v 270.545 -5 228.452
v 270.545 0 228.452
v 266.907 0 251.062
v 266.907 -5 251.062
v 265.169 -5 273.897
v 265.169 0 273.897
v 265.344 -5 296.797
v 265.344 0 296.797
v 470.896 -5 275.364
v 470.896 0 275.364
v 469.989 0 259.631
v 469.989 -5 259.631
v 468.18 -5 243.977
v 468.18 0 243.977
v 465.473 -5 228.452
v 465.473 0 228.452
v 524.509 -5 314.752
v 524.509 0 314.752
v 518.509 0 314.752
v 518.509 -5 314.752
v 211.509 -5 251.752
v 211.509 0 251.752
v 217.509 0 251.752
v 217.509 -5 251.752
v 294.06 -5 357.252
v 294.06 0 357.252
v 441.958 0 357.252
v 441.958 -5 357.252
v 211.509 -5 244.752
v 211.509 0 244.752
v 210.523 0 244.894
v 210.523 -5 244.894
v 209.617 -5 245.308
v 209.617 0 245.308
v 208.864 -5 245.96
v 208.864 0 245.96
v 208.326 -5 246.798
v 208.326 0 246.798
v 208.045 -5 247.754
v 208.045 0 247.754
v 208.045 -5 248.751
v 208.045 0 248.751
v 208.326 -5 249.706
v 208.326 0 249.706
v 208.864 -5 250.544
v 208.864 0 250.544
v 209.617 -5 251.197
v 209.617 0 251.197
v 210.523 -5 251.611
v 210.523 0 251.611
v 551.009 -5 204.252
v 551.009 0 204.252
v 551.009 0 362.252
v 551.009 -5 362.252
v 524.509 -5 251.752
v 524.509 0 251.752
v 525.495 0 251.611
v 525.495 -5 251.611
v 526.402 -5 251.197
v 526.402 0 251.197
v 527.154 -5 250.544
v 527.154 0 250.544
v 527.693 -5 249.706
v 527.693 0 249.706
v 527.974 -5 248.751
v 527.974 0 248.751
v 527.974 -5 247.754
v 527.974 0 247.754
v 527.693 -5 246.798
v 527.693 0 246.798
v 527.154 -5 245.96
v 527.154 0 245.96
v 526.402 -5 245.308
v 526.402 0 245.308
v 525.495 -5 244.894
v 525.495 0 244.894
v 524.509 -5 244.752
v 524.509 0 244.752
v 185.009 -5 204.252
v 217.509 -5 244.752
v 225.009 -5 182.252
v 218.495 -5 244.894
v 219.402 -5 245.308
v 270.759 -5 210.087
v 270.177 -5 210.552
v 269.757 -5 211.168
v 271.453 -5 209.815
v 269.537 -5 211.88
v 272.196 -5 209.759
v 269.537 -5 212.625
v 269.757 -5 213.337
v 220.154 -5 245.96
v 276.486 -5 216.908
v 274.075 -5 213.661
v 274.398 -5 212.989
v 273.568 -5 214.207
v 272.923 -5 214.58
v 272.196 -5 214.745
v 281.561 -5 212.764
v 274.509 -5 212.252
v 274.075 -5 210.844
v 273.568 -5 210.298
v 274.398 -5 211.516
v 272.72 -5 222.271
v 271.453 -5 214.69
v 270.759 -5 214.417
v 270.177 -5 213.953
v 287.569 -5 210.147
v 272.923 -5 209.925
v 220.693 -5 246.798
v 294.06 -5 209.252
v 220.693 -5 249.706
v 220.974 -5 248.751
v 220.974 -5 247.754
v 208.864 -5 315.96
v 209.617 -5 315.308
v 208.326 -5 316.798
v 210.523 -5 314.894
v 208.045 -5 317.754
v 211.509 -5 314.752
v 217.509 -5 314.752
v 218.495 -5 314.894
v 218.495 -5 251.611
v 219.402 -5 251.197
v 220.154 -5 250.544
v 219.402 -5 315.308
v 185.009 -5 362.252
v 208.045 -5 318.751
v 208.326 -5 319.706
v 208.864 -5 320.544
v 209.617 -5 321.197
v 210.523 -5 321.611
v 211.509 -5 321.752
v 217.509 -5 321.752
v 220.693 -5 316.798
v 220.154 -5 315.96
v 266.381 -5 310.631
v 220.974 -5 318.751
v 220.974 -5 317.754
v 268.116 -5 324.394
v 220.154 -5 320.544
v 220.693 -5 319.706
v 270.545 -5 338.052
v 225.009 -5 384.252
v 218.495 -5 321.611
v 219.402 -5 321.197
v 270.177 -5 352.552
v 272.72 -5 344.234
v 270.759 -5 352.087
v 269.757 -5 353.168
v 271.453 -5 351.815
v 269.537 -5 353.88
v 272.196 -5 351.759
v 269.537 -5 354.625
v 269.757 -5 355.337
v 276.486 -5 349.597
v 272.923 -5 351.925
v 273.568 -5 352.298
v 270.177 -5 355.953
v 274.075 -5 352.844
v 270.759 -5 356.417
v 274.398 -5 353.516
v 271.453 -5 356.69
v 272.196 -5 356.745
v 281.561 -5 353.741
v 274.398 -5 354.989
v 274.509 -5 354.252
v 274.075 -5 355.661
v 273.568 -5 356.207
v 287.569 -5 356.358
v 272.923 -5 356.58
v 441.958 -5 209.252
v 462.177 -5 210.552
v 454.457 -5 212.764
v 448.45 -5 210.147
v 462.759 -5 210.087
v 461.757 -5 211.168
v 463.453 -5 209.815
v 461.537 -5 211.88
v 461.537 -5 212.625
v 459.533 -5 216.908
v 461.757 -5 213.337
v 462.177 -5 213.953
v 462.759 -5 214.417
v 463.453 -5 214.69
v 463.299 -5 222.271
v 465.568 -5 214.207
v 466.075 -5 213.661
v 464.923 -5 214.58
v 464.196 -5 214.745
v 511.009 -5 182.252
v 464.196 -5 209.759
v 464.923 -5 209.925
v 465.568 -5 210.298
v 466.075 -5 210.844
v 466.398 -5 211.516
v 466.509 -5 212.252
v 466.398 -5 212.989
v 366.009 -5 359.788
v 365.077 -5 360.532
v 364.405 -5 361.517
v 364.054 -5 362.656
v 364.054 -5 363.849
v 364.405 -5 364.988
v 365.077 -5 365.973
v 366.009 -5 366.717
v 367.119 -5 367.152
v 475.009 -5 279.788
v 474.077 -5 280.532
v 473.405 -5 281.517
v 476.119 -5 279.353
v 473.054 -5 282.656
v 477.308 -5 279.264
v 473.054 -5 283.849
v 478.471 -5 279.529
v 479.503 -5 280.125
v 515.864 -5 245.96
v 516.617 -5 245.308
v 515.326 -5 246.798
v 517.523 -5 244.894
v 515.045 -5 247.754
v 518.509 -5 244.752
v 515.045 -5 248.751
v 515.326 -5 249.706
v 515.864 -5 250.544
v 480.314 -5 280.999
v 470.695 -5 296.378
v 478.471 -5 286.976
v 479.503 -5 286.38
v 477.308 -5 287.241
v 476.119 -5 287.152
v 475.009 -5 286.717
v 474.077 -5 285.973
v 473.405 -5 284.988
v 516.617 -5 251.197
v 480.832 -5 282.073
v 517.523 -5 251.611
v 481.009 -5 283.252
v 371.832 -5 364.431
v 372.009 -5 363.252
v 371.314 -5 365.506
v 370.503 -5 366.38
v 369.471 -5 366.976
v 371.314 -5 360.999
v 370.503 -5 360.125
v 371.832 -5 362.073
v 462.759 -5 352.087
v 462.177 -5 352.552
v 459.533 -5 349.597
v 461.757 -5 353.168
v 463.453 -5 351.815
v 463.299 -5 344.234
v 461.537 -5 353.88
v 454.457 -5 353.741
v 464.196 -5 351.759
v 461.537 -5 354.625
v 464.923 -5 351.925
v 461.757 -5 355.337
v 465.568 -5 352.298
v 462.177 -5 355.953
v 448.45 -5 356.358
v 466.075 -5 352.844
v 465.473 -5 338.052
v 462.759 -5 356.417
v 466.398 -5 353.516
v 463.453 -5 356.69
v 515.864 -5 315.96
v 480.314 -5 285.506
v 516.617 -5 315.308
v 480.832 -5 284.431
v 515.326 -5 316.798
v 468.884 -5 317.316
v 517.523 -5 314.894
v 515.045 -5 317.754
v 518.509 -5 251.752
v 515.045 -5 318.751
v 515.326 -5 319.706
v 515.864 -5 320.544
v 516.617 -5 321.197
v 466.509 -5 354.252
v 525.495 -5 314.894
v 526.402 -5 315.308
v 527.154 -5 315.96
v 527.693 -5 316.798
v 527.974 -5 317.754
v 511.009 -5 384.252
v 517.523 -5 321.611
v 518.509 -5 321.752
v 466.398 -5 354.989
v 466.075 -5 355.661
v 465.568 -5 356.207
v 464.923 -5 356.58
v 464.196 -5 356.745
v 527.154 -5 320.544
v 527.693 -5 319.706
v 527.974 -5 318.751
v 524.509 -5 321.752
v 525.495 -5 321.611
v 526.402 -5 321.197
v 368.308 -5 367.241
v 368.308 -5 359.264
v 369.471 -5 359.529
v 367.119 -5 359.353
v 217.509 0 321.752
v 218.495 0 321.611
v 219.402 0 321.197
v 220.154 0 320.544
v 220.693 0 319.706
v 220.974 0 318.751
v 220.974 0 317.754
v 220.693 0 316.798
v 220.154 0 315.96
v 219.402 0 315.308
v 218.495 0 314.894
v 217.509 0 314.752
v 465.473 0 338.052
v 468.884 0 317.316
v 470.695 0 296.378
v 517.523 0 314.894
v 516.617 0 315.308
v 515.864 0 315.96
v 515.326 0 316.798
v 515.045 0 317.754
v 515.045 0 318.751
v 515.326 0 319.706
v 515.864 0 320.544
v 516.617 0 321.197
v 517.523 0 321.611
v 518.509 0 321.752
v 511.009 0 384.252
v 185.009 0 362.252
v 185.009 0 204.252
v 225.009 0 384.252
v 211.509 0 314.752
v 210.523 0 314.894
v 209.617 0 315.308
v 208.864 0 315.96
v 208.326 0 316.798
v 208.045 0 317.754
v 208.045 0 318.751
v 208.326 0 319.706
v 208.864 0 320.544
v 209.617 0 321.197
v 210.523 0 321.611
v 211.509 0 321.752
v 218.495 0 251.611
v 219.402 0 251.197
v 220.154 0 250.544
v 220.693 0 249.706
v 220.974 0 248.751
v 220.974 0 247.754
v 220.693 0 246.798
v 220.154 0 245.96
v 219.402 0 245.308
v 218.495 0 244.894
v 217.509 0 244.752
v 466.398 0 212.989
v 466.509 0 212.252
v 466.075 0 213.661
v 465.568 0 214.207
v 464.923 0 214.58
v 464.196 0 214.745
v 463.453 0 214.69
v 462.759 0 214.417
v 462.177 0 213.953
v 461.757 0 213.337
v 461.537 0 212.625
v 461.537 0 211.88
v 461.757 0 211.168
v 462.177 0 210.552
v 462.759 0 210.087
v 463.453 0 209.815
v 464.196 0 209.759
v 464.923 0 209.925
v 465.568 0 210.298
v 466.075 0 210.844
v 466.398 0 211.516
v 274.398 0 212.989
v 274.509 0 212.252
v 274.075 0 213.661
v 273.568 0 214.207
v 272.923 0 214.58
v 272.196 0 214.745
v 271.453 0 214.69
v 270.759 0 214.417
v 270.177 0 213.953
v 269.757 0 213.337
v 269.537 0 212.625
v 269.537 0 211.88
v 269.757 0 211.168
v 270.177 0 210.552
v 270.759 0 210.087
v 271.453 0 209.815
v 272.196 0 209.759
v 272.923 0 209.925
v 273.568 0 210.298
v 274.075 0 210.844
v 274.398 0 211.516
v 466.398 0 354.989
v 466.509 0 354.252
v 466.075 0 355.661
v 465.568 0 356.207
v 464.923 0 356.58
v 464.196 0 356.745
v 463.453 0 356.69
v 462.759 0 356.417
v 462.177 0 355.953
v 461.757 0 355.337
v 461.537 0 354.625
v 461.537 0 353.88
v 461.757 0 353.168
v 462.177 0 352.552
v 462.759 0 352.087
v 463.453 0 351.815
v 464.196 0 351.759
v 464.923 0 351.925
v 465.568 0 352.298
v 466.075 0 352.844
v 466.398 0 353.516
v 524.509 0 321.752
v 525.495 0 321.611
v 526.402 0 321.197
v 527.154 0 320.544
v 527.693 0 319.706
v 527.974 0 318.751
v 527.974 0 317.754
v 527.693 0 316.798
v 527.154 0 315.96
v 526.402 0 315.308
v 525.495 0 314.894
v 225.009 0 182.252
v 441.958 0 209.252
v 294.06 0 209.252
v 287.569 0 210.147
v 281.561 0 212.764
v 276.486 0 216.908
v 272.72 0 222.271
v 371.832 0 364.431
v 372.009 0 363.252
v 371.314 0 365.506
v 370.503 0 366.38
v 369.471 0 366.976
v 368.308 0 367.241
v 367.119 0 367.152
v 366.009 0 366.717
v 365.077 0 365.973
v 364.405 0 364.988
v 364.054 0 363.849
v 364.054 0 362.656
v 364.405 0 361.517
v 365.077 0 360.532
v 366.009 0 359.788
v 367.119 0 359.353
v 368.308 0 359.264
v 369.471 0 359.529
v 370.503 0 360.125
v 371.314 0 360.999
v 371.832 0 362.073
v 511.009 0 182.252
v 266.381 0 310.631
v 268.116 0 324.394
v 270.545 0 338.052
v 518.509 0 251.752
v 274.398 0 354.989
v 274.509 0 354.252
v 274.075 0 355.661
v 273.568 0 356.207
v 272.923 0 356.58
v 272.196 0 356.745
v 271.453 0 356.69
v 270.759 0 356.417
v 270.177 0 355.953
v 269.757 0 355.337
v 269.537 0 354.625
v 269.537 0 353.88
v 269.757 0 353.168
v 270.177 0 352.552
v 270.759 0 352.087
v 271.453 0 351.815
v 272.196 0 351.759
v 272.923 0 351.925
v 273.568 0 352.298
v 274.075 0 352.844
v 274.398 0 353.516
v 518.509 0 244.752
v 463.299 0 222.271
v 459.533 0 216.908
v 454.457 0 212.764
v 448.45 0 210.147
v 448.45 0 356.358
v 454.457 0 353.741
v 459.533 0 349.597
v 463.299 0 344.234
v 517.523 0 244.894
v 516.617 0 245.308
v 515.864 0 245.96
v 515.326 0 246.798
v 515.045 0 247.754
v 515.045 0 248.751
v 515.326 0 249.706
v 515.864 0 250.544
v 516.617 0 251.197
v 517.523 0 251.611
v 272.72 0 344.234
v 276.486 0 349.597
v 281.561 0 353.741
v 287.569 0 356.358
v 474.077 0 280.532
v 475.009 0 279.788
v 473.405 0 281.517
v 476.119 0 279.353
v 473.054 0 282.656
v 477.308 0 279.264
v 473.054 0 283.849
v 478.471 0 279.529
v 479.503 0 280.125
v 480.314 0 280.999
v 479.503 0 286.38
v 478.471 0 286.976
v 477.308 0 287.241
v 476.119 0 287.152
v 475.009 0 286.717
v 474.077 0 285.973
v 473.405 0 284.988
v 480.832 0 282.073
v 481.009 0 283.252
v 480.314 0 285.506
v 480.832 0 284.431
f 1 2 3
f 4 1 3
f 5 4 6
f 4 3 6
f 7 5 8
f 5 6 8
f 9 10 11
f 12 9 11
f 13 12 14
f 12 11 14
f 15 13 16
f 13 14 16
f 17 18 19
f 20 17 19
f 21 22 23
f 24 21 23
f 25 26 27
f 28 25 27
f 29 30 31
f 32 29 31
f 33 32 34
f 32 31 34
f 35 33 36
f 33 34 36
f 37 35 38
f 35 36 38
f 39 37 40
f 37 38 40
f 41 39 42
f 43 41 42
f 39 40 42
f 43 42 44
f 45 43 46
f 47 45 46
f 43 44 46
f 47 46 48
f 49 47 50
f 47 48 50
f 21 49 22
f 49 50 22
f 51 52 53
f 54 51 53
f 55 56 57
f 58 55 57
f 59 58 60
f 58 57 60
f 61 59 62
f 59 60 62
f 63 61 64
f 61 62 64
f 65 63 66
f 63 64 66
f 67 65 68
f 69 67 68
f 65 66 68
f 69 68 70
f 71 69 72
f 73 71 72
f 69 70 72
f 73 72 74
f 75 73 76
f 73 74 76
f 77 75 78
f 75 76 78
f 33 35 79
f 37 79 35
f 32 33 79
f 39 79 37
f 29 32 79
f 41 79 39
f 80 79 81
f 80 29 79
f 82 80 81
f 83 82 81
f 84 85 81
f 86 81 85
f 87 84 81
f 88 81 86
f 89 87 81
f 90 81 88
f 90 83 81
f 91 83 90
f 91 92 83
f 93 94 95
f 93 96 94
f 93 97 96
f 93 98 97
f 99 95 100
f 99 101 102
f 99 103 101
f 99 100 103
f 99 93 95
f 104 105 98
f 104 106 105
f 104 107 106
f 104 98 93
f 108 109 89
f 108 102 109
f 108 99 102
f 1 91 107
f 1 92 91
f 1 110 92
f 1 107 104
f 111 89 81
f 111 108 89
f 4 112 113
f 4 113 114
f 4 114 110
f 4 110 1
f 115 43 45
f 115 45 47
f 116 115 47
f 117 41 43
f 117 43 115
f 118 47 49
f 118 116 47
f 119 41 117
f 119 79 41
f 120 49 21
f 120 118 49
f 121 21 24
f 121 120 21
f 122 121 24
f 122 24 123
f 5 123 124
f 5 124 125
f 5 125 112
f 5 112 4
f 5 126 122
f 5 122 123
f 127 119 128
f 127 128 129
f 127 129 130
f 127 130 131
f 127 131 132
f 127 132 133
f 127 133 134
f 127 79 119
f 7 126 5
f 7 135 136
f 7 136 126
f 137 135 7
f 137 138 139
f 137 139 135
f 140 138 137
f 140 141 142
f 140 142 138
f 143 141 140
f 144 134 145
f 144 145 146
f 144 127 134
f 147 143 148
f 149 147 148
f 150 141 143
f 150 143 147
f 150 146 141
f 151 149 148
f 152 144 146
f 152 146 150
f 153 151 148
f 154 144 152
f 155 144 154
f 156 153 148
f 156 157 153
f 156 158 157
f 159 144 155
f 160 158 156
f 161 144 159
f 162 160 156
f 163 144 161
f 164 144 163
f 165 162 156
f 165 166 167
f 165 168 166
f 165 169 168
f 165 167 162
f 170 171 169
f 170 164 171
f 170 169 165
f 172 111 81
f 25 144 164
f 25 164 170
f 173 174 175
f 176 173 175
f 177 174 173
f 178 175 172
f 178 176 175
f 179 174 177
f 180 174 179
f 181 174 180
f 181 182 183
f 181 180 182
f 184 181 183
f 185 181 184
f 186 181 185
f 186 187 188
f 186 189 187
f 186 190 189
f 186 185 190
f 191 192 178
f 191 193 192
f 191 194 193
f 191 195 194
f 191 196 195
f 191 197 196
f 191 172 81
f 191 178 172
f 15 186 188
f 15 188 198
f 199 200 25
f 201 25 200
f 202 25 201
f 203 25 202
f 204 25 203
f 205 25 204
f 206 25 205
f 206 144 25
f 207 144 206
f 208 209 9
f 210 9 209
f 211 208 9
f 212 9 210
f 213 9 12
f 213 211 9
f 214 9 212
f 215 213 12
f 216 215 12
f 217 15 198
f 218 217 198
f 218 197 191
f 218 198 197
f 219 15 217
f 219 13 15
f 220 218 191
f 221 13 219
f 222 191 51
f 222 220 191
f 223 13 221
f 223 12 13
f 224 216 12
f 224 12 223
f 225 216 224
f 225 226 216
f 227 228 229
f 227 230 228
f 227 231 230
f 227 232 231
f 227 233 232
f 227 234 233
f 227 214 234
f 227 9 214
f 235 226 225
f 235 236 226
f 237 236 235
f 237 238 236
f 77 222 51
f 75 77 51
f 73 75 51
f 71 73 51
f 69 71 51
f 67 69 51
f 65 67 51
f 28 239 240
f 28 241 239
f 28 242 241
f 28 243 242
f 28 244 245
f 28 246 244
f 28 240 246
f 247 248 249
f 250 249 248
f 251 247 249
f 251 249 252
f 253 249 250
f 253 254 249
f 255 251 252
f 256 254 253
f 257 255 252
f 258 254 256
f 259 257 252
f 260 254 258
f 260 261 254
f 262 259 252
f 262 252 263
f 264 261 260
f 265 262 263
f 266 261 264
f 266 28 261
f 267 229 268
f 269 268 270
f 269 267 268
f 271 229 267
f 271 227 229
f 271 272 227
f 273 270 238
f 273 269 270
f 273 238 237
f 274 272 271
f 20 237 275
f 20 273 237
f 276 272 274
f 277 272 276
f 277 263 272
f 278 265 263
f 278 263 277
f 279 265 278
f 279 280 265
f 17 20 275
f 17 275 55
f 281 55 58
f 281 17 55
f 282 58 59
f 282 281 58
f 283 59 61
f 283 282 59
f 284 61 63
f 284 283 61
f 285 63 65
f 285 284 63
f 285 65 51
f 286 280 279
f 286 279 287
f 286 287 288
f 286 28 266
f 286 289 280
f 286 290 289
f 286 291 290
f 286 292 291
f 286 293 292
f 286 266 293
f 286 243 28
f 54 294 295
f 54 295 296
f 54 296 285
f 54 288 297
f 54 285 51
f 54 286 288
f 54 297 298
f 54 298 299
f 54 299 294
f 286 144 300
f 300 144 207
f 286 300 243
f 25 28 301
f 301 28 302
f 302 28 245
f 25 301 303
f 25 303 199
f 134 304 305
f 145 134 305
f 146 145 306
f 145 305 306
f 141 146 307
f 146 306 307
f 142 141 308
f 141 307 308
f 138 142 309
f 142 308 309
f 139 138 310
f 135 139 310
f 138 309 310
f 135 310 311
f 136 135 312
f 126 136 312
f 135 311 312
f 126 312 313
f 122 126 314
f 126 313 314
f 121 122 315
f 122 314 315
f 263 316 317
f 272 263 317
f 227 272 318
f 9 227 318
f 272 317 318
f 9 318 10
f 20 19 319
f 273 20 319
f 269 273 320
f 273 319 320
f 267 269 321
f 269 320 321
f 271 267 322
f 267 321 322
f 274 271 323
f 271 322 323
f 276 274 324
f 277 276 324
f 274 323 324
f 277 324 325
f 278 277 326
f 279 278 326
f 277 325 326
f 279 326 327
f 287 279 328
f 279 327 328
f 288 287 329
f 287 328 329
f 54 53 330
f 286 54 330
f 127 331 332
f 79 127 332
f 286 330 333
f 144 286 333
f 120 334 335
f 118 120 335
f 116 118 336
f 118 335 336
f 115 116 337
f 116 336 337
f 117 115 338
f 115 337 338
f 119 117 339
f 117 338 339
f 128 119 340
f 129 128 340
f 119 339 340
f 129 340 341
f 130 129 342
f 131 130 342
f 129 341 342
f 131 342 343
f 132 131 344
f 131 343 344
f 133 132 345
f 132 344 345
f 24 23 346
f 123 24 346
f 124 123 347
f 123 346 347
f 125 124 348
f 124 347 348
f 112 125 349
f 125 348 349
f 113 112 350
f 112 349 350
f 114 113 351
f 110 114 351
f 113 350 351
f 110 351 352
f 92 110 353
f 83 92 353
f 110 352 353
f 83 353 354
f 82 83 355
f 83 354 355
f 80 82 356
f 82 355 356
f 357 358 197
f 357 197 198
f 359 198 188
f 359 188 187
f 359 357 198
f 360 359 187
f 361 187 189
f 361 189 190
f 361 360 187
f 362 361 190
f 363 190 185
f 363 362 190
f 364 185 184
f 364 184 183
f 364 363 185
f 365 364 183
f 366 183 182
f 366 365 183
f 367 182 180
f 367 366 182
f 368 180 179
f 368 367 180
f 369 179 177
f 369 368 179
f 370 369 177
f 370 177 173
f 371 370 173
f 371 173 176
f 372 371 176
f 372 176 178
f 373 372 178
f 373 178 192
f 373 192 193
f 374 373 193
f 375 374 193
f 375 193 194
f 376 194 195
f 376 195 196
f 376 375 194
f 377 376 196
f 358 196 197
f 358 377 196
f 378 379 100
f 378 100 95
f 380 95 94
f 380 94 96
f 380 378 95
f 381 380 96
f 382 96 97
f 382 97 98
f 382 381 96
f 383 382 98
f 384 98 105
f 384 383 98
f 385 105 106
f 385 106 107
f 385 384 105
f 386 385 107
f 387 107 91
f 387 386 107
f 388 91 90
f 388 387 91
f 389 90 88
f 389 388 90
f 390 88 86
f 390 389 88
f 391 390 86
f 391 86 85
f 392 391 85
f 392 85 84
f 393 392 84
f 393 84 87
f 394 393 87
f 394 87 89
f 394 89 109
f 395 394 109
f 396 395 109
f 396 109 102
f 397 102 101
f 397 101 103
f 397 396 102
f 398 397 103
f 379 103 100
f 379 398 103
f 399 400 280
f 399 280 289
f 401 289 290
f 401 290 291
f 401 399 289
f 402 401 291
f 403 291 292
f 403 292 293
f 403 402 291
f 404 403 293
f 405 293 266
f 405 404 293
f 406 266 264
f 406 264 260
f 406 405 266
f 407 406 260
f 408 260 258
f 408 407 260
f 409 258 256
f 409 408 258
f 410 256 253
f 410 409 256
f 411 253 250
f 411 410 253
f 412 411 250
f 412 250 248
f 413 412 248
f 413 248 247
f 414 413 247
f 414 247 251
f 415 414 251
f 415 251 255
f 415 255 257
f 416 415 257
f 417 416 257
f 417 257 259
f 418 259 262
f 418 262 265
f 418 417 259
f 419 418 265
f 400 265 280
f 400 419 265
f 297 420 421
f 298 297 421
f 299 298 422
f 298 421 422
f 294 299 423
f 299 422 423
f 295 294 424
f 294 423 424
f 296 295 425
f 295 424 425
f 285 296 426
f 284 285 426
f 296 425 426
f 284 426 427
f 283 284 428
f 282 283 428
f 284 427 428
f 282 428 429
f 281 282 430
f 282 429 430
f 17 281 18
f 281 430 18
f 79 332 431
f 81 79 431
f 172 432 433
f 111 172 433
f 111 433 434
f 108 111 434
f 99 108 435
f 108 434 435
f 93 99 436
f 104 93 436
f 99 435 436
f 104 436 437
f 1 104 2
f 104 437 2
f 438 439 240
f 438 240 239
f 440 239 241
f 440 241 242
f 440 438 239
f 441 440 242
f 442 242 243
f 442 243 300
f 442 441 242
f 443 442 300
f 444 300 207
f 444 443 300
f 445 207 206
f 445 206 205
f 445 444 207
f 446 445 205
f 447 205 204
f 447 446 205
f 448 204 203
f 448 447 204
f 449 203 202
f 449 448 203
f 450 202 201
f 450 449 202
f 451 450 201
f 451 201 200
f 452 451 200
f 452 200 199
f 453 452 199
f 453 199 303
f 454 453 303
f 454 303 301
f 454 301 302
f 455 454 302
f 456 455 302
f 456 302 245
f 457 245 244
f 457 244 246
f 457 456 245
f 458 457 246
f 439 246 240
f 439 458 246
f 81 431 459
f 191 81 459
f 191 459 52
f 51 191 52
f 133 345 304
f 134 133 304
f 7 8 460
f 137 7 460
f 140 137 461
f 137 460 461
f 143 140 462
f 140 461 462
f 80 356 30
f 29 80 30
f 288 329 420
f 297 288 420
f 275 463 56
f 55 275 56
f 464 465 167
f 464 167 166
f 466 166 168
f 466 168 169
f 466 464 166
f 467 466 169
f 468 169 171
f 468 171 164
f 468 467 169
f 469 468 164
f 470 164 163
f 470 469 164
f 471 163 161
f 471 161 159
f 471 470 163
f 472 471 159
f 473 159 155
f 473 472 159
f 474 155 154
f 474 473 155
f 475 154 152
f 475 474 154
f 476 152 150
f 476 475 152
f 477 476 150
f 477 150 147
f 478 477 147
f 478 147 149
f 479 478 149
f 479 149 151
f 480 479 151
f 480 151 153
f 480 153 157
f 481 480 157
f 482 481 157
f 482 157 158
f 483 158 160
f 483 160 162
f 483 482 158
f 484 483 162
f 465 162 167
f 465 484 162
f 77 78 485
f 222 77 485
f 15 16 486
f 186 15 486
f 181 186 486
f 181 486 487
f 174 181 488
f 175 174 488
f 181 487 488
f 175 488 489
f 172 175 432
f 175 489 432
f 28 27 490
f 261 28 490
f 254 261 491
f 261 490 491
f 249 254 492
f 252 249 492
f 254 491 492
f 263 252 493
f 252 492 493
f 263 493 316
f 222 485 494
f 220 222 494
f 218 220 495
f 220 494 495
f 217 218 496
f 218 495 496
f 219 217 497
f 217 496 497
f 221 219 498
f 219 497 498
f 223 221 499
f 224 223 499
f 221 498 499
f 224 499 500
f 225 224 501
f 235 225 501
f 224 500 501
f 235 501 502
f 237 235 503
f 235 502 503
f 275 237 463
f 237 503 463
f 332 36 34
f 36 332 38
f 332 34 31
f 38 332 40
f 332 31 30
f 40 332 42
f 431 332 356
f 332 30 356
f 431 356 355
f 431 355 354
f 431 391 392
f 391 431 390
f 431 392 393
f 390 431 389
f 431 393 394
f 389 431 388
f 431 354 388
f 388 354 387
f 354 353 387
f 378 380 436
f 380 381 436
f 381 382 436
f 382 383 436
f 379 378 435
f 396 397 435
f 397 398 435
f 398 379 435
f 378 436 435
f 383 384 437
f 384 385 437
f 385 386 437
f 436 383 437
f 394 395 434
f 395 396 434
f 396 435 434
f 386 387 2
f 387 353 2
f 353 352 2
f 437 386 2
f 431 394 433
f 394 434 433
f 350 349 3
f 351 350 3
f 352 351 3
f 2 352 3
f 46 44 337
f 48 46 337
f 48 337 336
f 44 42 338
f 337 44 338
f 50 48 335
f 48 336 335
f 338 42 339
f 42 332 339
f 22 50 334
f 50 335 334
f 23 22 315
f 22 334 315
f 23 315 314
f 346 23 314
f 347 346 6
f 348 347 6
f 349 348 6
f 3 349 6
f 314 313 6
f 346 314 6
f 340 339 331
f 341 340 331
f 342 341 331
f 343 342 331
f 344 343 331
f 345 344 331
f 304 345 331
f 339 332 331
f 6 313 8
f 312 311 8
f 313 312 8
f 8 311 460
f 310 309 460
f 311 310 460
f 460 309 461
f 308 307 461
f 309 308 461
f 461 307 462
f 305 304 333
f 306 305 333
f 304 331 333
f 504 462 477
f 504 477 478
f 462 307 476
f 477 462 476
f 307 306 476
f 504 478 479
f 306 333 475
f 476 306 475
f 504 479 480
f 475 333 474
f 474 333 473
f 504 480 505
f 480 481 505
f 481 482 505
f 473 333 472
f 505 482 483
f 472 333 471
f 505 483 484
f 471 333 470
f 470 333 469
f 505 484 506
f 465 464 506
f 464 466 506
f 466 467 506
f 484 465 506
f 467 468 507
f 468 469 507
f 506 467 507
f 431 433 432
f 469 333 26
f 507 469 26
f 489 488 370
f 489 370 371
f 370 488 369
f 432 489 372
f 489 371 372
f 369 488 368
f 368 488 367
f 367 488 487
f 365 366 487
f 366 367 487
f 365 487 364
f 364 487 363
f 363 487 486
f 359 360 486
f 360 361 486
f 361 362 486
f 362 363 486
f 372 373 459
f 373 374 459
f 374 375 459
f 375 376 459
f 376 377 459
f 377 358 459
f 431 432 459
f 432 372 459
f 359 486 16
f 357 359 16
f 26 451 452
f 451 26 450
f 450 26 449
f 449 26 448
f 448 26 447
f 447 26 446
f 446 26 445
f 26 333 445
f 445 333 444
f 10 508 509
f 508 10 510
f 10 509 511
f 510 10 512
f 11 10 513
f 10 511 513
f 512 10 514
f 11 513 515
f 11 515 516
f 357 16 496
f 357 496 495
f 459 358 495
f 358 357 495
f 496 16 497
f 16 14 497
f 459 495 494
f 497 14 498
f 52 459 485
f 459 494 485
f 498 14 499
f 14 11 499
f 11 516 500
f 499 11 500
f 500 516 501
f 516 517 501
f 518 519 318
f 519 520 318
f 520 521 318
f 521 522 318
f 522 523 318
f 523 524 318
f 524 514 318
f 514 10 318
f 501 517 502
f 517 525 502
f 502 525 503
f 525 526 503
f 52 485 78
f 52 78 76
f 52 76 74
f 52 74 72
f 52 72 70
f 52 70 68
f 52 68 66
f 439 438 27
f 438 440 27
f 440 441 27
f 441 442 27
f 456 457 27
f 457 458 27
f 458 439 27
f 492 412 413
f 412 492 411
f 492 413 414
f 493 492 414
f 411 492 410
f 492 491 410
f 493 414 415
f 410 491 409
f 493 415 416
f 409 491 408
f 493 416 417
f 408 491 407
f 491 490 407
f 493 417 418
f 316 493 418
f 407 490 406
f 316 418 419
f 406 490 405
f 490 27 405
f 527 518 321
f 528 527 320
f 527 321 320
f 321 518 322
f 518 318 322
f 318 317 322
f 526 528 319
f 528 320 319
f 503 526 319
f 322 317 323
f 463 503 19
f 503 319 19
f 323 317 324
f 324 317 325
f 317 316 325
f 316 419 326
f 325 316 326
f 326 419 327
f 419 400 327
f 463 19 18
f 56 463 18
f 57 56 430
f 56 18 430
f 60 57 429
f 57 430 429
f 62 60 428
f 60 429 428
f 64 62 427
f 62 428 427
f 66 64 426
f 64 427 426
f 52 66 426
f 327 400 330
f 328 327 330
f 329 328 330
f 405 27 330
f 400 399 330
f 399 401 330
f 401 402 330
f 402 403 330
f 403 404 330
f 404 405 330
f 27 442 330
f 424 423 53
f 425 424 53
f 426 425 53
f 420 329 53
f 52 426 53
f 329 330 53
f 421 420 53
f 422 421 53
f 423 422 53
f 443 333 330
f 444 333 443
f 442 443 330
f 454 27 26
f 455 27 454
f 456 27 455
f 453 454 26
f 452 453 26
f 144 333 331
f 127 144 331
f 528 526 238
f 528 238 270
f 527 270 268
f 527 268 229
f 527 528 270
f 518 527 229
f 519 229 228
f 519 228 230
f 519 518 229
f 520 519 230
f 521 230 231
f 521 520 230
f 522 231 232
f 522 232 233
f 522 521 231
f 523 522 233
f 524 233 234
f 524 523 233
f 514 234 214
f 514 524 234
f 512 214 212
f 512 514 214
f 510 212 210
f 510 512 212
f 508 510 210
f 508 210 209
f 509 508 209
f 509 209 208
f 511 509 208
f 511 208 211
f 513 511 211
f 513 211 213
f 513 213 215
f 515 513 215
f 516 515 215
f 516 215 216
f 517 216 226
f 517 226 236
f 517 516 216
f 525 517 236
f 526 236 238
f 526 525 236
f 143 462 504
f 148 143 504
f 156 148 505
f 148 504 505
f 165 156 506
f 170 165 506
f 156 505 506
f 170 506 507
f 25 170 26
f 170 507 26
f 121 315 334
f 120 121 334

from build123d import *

# Parameters (mm, degrees)
F0_R     = 2.5
F0_R_2   = 4
F1_DEPTH = 5


with BuildPart() as f1:
    # F0 (on Front) → F1 (new body)
    with BuildSketch(Plane.XZ):
        Polygon((185.009293, 204.252433), (225.009293, 182.252433), (368.009293, 182.252433), (511.009293, 182.252433), (551.009293, 204.252433), (551.009293, 362.252433), (511.009293, 384.252433), (389.4801139832, 384.252433), (225.009293, 384.252433), (185.009293, 362.252433), align=None)
        with BuildLine():
            Line((211.509293, 251.752433), (217.509293, 251.752433))
            ThreePointArc((217.509293, 251.752433), (221.009293, 248.252433), (217.509293, 244.752433))
            Line((217.509293, 244.752433), (211.509293, 244.752433))
            ThreePointArc((211.509293, 244.752433), (208.009293, 248.252433), (211.509293, 251.752433))
        make_face(mode=Mode.SUBTRACT)
        with Locations((272.009293, 212.252433)):
            Circle(F0_R, mode=Mode.SUBTRACT)
        with BuildLine():
            ThreePointArc((270.5452164665, 338.0524329864), (278.8813852258, 351.8427530574), (294.060318, 357.252433))
            Line((294.060318, 357.252433), (388.009293, 357.252433))
            Line((388.009293, 357.252433), (441.958267, 357.252433))
            ThreePointArc((441.958267, 357.252433), (457.1371997667, 351.8427530635), (465.4733685296, 338.0524330052))
            ThreePointArc((465.4733685296, 338.0524330052), (469.9900217644, 306.8643277742), (470.8957123265, 275.3638866829))
            ThreePointArc((470.8957123265, 275.3638866829), (469.1970699877, 251.7911247549), (465.4733685296, 228.4524328857))
            ThreePointArc((465.4733685296, 228.4524328857), (457.1371997667, 214.6621128274), (441.958267, 209.2524328909))
            Line((441.958267, 209.2524328909), (368.0092925, 209.2524328909))
            Line((368.0092925, 209.2524328909), (294.060318, 209.2524328909))
            ThreePointArc((294.060318, 209.2524328909), (278.8813852287, 214.6621128311), (270.545216468, 228.4524328972))
            ThreePointArc((270.545216468, 228.4524328972), (265.7992173248, 262.4616912169), (265.3442938418, 296.797491833))
            ThreePointArc((265.3442938418, 296.797491833), (267.1610334487, 317.523764537), (270.5452164665, 338.0524329864))
        make_face(mode=Mode.SUBTRACT)
        with BuildLine():
            ThreePointArc((211.509293, 314.752433), (208.009293, 318.252433), (211.509293, 321.752433))
            Line((211.509293, 321.752433), (217.509293, 321.752433))
            ThreePointArc((217.509293, 321.752433), (221.009293, 318.252433), (217.509293, 314.752433))
            Line((217.509293, 314.752433), (211.509293, 314.752433))
        make_face(mode=Mode.SUBTRACT)
        with Locations((272.009293, 354.252433)):
            Circle(F0_R, mode=Mode.SUBTRACT)
        with Locations((368.009293, 363.252433)):
            Circle(F0_R_2, mode=Mode.SUBTRACT)
        with Locations((464.009293, 212.252433)):
            Circle(F0_R, mode=Mode.SUBTRACT)
        with BuildLine():
            Line((518.509293, 251.752433), (524.509293, 251.752433))
            ThreePointArc((524.509293, 251.752433), (528.009293, 248.252433), (524.509293, 244.752433))
            Line((524.509293, 244.752433), (518.509293, 244.752433))
            ThreePointArc((518.509293, 244.752433), (515.009293, 248.252433), (518.509293, 251.752433))
        make_face(mode=Mode.SUBTRACT)
        with Locations((477.009293, 283.252433)):
            Circle(F0_R_2, mode=Mode.SUBTRACT)
        with BuildLine():
            Line((524.509293, 314.752433), (518.509293, 314.752433))
            ThreePointArc((518.509293, 314.752433), (515.009293, 318.252433), (518.509293, 321.752433))
            Line((518.509293, 321.752433), (524.509293, 321.752433))
            ThreePointArc((524.509293, 321.752433), (528.009293, 318.252433), (524.509293, 314.752433))
        make_face(mode=Mode.SUBTRACT)
        with Locations((464.009293, 354.252433)):
            Circle(F0_R, mode=Mode.SUBTRACT)
    extrude(amount=F1_DEPTH)


solid = f1.part
